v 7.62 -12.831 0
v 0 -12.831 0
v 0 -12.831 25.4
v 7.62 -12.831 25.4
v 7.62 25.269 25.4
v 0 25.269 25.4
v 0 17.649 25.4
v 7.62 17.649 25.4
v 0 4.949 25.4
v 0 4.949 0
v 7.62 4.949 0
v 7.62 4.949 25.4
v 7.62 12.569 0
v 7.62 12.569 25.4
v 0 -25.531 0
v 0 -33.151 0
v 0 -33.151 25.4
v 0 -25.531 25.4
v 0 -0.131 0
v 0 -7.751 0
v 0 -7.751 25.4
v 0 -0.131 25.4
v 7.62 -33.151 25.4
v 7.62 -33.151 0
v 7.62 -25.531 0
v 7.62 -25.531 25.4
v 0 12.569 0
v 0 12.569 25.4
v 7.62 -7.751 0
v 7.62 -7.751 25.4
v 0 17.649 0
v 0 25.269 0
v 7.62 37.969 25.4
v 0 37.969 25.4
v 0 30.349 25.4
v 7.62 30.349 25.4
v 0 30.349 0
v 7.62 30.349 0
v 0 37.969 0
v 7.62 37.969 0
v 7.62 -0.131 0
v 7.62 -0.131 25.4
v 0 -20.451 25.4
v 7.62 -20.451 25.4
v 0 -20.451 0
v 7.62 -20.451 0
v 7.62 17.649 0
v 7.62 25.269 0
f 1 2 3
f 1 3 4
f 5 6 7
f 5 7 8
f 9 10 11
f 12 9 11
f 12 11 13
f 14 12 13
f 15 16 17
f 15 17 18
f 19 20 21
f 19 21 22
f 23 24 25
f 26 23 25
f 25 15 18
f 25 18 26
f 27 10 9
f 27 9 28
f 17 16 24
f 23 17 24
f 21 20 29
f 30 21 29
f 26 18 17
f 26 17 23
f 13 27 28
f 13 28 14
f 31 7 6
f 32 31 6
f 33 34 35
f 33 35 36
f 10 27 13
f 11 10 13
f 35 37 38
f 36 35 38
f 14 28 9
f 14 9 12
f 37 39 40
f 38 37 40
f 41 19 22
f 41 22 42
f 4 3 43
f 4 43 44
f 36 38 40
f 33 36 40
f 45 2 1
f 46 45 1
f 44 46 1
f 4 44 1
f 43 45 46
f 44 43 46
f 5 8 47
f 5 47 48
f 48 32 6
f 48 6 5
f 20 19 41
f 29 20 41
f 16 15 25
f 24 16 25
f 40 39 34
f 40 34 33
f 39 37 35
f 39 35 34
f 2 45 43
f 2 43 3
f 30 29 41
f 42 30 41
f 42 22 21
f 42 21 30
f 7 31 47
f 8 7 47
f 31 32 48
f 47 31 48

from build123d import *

# Parameters (mm, degrees)
F2_W     = 7.62
F2_H     = 7.62
F3_DEPTH = 25.4


with BuildPart() as f3:
    # F2 (on Top) → F3 (new body)
    with BuildSketch(Plane.XY):
        with Locations((3.81, 34.15853)):
            Rectangle(F2_W, F2_H)
        with Locations((3.81, 21.45853)):
            Rectangle(F2_W, F2_H)
        with Locations((3.81, 8.75853)):
            Rectangle(F2_W, F2_H)
        with Locations((3.81, -3.94147)):
            Rectangle(F2_W, F2_H)
        with Locations((3.81, -16.64147)):
            Rectangle(F2_W, F2_H)
        with Locations((3.81, -29.34147)):
            Rectangle(F2_W, F2_H)
    extrude(amount=F3_DEPTH)


solid = f3.part
